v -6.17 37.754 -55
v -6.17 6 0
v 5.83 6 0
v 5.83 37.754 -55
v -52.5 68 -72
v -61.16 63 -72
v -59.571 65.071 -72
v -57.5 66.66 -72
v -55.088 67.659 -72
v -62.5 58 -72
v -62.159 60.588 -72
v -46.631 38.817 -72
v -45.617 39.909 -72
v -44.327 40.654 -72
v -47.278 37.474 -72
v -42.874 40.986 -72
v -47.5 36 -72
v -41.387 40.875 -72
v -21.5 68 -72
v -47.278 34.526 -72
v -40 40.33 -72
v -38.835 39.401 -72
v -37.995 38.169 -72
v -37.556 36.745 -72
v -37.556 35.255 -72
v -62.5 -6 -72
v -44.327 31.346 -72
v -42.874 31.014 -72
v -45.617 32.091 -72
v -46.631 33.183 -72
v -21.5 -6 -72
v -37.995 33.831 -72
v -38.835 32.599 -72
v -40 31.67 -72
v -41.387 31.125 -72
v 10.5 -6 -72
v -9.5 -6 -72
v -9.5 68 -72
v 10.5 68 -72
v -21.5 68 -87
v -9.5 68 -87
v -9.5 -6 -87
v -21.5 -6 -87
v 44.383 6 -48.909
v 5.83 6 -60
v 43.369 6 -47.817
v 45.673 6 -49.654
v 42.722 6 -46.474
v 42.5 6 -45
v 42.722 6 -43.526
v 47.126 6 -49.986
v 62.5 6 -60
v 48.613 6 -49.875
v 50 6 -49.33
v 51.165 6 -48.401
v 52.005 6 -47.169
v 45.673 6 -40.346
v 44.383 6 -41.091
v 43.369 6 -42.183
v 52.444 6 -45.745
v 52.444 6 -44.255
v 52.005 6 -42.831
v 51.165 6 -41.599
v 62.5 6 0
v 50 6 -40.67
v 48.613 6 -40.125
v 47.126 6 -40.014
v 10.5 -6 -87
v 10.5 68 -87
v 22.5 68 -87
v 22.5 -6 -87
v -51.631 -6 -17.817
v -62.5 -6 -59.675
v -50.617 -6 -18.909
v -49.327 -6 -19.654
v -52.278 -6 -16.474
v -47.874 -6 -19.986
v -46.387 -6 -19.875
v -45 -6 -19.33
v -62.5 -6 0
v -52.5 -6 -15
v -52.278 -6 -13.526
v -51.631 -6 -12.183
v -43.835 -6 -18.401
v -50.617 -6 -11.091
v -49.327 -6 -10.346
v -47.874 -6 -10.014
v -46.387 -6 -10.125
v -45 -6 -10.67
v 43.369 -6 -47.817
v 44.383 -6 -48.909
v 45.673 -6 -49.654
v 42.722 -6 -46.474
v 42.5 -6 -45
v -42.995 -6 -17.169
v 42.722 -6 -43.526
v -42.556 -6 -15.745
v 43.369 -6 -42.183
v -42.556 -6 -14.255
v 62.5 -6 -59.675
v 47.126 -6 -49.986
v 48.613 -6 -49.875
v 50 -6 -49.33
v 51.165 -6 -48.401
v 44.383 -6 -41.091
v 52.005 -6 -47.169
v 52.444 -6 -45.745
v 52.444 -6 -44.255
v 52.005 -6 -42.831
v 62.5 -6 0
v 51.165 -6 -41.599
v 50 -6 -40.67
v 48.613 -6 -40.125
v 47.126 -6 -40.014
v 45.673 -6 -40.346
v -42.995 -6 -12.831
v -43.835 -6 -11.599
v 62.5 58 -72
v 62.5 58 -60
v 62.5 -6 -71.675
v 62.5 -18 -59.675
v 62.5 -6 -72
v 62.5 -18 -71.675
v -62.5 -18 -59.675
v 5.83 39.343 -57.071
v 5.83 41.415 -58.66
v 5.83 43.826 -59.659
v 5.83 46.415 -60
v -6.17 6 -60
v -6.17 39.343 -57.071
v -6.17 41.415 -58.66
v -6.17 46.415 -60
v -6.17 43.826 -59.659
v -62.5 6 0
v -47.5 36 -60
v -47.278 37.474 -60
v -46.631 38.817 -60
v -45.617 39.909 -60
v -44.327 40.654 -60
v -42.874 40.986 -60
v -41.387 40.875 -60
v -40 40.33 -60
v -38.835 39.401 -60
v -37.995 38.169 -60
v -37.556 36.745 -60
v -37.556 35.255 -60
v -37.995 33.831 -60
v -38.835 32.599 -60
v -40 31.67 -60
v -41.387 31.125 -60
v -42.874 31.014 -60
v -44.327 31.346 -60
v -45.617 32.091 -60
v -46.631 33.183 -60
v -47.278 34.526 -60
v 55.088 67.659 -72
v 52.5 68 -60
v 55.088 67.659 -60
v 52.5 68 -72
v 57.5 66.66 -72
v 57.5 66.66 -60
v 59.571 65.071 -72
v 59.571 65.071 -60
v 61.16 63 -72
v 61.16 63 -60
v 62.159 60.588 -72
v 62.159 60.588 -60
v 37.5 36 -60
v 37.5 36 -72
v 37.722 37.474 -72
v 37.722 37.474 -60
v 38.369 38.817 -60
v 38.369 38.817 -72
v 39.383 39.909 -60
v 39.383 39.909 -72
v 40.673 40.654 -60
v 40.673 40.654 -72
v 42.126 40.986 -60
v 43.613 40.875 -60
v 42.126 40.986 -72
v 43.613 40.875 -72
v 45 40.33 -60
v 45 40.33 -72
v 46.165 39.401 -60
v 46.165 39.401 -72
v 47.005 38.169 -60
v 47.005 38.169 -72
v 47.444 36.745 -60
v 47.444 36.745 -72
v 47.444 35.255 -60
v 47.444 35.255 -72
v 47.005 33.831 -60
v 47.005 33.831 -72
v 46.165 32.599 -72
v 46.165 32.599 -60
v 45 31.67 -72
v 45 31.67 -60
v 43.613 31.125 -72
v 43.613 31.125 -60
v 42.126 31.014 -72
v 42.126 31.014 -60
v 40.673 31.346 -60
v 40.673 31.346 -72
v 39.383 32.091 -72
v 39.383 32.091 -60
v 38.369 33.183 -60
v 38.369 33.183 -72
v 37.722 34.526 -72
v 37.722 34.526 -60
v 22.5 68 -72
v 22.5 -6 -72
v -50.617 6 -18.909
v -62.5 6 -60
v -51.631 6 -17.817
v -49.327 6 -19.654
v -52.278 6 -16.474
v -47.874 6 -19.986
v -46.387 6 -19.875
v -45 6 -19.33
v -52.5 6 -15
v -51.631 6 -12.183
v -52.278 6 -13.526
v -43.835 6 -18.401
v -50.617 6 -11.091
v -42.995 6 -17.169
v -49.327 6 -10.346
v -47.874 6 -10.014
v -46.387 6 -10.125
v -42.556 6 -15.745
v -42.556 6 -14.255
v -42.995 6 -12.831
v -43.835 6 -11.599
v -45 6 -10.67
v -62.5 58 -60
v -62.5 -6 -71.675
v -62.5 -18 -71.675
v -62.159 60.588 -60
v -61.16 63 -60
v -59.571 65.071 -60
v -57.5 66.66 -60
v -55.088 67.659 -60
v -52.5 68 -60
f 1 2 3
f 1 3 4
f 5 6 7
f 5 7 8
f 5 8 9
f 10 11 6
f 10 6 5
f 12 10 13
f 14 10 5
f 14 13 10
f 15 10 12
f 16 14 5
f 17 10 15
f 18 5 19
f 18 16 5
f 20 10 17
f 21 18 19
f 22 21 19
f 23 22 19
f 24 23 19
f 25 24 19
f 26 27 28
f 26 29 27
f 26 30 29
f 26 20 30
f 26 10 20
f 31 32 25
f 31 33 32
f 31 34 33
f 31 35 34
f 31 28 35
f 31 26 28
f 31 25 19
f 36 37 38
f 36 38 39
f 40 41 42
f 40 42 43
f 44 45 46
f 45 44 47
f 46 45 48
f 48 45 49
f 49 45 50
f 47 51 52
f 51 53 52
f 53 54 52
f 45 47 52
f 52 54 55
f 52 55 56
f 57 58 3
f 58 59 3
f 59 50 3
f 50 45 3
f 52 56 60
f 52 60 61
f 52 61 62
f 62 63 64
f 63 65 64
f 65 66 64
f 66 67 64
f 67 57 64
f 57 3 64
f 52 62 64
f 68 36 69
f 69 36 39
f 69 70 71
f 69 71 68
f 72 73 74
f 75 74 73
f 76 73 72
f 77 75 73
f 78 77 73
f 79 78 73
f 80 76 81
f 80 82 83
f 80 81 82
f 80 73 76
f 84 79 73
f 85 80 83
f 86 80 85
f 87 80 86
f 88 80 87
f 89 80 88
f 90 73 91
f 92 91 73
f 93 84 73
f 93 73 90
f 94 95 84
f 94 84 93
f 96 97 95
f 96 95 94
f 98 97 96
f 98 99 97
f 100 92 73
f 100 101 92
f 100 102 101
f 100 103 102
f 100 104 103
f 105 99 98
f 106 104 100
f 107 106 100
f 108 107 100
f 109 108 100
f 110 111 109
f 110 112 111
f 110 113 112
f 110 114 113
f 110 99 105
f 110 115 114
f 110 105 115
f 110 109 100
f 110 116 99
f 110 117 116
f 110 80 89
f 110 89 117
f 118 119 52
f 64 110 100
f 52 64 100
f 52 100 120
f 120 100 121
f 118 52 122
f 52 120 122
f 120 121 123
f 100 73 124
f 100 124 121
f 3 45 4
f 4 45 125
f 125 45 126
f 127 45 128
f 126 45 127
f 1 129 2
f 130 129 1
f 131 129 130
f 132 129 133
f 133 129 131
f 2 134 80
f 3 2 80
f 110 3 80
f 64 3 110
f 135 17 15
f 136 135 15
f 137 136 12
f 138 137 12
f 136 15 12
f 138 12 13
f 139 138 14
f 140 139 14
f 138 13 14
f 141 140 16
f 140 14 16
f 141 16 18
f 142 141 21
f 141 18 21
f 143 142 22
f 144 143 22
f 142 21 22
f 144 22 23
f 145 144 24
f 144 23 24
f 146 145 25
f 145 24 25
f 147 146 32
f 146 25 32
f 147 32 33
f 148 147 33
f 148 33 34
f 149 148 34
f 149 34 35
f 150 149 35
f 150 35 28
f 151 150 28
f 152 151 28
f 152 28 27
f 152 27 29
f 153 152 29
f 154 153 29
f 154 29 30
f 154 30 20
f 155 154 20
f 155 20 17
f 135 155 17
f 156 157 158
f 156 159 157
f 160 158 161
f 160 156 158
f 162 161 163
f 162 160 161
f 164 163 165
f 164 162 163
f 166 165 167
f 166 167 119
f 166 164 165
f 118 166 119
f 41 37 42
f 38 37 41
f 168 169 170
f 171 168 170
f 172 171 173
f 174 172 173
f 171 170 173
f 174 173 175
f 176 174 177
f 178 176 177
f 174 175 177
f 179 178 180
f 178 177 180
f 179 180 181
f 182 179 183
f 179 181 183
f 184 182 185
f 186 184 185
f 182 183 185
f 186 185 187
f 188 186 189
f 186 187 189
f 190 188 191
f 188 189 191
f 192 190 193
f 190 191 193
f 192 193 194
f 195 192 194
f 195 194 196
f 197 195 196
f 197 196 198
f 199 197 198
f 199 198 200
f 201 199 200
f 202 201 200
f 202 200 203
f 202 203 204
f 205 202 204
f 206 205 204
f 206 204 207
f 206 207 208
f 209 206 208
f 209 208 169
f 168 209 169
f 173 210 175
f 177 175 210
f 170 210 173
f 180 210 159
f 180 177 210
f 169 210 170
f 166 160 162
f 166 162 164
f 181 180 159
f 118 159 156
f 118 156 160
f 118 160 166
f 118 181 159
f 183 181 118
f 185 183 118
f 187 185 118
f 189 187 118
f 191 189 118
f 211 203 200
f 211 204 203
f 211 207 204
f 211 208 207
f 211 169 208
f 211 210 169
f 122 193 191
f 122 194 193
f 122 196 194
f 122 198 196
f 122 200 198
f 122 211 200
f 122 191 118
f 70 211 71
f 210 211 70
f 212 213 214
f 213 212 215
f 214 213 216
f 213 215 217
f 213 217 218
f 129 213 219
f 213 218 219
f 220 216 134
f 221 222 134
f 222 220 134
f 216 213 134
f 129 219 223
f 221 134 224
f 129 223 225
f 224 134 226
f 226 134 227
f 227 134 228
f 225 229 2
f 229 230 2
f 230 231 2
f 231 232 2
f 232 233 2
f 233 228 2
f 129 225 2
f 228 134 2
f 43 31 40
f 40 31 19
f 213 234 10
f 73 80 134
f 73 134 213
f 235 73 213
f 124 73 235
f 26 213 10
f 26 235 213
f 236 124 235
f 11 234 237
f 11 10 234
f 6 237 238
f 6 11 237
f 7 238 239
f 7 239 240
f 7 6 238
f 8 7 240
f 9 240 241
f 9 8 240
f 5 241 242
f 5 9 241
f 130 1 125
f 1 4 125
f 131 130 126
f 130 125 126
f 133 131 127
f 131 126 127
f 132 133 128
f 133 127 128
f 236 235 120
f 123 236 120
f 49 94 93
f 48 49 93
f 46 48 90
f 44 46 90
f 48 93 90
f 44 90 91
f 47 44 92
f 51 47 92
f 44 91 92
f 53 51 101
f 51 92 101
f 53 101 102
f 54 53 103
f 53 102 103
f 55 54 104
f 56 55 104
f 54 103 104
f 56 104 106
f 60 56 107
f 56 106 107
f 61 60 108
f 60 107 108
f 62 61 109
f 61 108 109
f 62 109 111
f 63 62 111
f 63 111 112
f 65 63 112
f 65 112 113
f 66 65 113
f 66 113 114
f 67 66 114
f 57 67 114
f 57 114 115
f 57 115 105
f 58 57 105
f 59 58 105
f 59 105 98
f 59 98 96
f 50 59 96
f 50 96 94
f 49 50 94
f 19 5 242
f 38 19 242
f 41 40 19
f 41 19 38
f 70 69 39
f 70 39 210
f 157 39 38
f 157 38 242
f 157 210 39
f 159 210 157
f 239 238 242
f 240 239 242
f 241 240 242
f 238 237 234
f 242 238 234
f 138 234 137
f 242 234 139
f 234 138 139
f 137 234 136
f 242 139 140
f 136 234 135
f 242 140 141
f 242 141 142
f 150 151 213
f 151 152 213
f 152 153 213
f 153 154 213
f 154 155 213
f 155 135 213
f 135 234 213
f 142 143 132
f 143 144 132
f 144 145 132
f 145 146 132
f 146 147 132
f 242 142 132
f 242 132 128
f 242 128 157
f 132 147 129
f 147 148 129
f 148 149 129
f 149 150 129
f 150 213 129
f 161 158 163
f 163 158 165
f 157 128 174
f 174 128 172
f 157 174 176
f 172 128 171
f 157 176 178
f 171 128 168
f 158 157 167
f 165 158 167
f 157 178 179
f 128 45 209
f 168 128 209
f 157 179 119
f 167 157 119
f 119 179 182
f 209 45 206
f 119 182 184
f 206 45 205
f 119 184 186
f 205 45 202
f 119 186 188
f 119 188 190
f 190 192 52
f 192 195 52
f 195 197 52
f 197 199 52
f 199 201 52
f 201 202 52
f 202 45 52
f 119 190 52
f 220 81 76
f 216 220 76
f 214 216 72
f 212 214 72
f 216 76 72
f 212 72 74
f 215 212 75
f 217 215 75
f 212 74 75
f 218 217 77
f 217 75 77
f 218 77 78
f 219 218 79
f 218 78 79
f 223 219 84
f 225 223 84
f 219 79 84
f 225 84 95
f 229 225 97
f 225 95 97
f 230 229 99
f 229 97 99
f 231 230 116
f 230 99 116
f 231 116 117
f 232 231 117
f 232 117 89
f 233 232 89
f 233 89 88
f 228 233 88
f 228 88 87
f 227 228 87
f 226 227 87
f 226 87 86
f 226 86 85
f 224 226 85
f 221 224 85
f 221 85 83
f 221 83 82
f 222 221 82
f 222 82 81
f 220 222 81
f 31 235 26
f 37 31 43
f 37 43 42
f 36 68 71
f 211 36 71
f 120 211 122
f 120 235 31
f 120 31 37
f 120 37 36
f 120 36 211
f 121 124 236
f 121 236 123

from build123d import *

# Parameters (mm, degrees)
SKETCH1_W              = 125
SKETCH1_H              = 12
BOSS_EXTRUDE1_DEPTH    = 72
SKETCH2_W              = 125
SKETCH2_H              = 12
BOSS_EXTRUDE2_DEPTH    = 62
SKETCH3_W              = 12
SKETCH3_H              = 74
BOSS_EXTRUDE3_DEPTH    = 15
SKETCH4_W              = 125
SKETCH4_H              = 12
BOSS_EXTRUDE4_DEPTH    = 12
FILLET1_R              = 10
SKETCH5_W              = 12
SKETCH5_H              = 62
BOSS_EXTRUDE5_DEPTH    = 60
CUT_EXTRUDE4_DEPTH     = 12
FILLET2_R              = 10
F_10_0MM_DOWEL_SLOT1_D = 10
F_10_0MM_DOWEL_SLOT2_D = 10


with BuildPart() as part:
    # Sketch1 → Boss-Extrude1 (new body)
    with BuildSketch(Plane.XY):
        Rectangle(SKETCH1_W, SKETCH1_H)
    extrude(amount=-BOSS_EXTRUDE1_DEPTH)

    # Sketch2 → Boss-Extrude2 (add)
    with BuildSketch(Plane(origin=(0, 6, 0), x_dir=(1, 0, 0), z_dir=(0, 1, 0))):
        with Locations((0, 66)):
            Rectangle(SKETCH2_W, SKETCH2_H)
    extrude(amount=BOSS_EXTRUDE2_DEPTH)

    # Sketch3 → Boss-Extrude3 (add)
    with BuildSketch(Plane(origin=(0, 0, -72), x_dir=(-1, 0, 0), z_dir=(0, 0, -1))):
        with Locations((-16.5, 31)):
            Rectangle(SKETCH3_W, SKETCH3_H)
        with Locations((15.5, 31)):
            Rectangle(SKETCH3_W, SKETCH3_H)
    extrude(amount=BOSS_EXTRUDE3_DEPTH)

    # Sketch4 → Boss-Extrude4 (add)
    with BuildSketch(Plane.XZ.offset(6)):
        with Locations((0, -65.675154964)):
            Rectangle(SKETCH4_W, SKETCH4_H)
    extrude(amount=BOSS_EXTRUDE4_DEPTH)

    # Fillet1
    fillet1_edges = [part.edges().sort_by_distance(p)[0] for p in [
        (-62.5, 68, -66),
        (62.5, 68, -66),
    ]]
    fillet(fillet1_edges, radius=FILLET1_R)

    # Sketch5 → Boss-Extrude5 (add)
    with BuildSketch(Plane.XY.offset(-60)):
        with Locations((-0.169803283, 37)):
            Rectangle(SKETCH5_W, SKETCH5_H)
    extrude(amount=BOSS_EXTRUDE5_DEPTH)

    # Sketch6 → Cut-Extrude4 (cut)
    with BuildSketch(Plane.ZY.offset(6.169803283)):
        Polygon((0, 6), (-60, 40.641016151), (-60, 68), (0, 68), align=None)
    extrude(amount=-CUT_EXTRUDE4_DEPTH, mode=Mode.SUBTRACT)

    # Fillet2
    fillet2_edges = [part.edges().sort_by_distance(p)[0] for p in [
        (-0.169803283, 40.641016151, -60),
    ]]
    fillet(fillet2_edges, radius=FILLET2_R)

    # Ø10.0mm Dowel Slot1 (through all)
    with Locations(Plane.XY.offset(-60)):
        with Locations((42.5, 36), (-42.5, 36)):
            Hole(F_10_0MM_DOWEL_SLOT1_D / 2)

    # Ø10.0mm Dowel Slot2 (through all)
    with Locations(Plane(origin=(0, 6, 0), x_dir=(1, 0, 0), z_dir=(0, 1, 0))):
        with Locations((-47.5, 15), (47.5, 45)):
            Hole(F_10_0MM_DOWEL_SLOT2_D / 2)


solid = part.part
